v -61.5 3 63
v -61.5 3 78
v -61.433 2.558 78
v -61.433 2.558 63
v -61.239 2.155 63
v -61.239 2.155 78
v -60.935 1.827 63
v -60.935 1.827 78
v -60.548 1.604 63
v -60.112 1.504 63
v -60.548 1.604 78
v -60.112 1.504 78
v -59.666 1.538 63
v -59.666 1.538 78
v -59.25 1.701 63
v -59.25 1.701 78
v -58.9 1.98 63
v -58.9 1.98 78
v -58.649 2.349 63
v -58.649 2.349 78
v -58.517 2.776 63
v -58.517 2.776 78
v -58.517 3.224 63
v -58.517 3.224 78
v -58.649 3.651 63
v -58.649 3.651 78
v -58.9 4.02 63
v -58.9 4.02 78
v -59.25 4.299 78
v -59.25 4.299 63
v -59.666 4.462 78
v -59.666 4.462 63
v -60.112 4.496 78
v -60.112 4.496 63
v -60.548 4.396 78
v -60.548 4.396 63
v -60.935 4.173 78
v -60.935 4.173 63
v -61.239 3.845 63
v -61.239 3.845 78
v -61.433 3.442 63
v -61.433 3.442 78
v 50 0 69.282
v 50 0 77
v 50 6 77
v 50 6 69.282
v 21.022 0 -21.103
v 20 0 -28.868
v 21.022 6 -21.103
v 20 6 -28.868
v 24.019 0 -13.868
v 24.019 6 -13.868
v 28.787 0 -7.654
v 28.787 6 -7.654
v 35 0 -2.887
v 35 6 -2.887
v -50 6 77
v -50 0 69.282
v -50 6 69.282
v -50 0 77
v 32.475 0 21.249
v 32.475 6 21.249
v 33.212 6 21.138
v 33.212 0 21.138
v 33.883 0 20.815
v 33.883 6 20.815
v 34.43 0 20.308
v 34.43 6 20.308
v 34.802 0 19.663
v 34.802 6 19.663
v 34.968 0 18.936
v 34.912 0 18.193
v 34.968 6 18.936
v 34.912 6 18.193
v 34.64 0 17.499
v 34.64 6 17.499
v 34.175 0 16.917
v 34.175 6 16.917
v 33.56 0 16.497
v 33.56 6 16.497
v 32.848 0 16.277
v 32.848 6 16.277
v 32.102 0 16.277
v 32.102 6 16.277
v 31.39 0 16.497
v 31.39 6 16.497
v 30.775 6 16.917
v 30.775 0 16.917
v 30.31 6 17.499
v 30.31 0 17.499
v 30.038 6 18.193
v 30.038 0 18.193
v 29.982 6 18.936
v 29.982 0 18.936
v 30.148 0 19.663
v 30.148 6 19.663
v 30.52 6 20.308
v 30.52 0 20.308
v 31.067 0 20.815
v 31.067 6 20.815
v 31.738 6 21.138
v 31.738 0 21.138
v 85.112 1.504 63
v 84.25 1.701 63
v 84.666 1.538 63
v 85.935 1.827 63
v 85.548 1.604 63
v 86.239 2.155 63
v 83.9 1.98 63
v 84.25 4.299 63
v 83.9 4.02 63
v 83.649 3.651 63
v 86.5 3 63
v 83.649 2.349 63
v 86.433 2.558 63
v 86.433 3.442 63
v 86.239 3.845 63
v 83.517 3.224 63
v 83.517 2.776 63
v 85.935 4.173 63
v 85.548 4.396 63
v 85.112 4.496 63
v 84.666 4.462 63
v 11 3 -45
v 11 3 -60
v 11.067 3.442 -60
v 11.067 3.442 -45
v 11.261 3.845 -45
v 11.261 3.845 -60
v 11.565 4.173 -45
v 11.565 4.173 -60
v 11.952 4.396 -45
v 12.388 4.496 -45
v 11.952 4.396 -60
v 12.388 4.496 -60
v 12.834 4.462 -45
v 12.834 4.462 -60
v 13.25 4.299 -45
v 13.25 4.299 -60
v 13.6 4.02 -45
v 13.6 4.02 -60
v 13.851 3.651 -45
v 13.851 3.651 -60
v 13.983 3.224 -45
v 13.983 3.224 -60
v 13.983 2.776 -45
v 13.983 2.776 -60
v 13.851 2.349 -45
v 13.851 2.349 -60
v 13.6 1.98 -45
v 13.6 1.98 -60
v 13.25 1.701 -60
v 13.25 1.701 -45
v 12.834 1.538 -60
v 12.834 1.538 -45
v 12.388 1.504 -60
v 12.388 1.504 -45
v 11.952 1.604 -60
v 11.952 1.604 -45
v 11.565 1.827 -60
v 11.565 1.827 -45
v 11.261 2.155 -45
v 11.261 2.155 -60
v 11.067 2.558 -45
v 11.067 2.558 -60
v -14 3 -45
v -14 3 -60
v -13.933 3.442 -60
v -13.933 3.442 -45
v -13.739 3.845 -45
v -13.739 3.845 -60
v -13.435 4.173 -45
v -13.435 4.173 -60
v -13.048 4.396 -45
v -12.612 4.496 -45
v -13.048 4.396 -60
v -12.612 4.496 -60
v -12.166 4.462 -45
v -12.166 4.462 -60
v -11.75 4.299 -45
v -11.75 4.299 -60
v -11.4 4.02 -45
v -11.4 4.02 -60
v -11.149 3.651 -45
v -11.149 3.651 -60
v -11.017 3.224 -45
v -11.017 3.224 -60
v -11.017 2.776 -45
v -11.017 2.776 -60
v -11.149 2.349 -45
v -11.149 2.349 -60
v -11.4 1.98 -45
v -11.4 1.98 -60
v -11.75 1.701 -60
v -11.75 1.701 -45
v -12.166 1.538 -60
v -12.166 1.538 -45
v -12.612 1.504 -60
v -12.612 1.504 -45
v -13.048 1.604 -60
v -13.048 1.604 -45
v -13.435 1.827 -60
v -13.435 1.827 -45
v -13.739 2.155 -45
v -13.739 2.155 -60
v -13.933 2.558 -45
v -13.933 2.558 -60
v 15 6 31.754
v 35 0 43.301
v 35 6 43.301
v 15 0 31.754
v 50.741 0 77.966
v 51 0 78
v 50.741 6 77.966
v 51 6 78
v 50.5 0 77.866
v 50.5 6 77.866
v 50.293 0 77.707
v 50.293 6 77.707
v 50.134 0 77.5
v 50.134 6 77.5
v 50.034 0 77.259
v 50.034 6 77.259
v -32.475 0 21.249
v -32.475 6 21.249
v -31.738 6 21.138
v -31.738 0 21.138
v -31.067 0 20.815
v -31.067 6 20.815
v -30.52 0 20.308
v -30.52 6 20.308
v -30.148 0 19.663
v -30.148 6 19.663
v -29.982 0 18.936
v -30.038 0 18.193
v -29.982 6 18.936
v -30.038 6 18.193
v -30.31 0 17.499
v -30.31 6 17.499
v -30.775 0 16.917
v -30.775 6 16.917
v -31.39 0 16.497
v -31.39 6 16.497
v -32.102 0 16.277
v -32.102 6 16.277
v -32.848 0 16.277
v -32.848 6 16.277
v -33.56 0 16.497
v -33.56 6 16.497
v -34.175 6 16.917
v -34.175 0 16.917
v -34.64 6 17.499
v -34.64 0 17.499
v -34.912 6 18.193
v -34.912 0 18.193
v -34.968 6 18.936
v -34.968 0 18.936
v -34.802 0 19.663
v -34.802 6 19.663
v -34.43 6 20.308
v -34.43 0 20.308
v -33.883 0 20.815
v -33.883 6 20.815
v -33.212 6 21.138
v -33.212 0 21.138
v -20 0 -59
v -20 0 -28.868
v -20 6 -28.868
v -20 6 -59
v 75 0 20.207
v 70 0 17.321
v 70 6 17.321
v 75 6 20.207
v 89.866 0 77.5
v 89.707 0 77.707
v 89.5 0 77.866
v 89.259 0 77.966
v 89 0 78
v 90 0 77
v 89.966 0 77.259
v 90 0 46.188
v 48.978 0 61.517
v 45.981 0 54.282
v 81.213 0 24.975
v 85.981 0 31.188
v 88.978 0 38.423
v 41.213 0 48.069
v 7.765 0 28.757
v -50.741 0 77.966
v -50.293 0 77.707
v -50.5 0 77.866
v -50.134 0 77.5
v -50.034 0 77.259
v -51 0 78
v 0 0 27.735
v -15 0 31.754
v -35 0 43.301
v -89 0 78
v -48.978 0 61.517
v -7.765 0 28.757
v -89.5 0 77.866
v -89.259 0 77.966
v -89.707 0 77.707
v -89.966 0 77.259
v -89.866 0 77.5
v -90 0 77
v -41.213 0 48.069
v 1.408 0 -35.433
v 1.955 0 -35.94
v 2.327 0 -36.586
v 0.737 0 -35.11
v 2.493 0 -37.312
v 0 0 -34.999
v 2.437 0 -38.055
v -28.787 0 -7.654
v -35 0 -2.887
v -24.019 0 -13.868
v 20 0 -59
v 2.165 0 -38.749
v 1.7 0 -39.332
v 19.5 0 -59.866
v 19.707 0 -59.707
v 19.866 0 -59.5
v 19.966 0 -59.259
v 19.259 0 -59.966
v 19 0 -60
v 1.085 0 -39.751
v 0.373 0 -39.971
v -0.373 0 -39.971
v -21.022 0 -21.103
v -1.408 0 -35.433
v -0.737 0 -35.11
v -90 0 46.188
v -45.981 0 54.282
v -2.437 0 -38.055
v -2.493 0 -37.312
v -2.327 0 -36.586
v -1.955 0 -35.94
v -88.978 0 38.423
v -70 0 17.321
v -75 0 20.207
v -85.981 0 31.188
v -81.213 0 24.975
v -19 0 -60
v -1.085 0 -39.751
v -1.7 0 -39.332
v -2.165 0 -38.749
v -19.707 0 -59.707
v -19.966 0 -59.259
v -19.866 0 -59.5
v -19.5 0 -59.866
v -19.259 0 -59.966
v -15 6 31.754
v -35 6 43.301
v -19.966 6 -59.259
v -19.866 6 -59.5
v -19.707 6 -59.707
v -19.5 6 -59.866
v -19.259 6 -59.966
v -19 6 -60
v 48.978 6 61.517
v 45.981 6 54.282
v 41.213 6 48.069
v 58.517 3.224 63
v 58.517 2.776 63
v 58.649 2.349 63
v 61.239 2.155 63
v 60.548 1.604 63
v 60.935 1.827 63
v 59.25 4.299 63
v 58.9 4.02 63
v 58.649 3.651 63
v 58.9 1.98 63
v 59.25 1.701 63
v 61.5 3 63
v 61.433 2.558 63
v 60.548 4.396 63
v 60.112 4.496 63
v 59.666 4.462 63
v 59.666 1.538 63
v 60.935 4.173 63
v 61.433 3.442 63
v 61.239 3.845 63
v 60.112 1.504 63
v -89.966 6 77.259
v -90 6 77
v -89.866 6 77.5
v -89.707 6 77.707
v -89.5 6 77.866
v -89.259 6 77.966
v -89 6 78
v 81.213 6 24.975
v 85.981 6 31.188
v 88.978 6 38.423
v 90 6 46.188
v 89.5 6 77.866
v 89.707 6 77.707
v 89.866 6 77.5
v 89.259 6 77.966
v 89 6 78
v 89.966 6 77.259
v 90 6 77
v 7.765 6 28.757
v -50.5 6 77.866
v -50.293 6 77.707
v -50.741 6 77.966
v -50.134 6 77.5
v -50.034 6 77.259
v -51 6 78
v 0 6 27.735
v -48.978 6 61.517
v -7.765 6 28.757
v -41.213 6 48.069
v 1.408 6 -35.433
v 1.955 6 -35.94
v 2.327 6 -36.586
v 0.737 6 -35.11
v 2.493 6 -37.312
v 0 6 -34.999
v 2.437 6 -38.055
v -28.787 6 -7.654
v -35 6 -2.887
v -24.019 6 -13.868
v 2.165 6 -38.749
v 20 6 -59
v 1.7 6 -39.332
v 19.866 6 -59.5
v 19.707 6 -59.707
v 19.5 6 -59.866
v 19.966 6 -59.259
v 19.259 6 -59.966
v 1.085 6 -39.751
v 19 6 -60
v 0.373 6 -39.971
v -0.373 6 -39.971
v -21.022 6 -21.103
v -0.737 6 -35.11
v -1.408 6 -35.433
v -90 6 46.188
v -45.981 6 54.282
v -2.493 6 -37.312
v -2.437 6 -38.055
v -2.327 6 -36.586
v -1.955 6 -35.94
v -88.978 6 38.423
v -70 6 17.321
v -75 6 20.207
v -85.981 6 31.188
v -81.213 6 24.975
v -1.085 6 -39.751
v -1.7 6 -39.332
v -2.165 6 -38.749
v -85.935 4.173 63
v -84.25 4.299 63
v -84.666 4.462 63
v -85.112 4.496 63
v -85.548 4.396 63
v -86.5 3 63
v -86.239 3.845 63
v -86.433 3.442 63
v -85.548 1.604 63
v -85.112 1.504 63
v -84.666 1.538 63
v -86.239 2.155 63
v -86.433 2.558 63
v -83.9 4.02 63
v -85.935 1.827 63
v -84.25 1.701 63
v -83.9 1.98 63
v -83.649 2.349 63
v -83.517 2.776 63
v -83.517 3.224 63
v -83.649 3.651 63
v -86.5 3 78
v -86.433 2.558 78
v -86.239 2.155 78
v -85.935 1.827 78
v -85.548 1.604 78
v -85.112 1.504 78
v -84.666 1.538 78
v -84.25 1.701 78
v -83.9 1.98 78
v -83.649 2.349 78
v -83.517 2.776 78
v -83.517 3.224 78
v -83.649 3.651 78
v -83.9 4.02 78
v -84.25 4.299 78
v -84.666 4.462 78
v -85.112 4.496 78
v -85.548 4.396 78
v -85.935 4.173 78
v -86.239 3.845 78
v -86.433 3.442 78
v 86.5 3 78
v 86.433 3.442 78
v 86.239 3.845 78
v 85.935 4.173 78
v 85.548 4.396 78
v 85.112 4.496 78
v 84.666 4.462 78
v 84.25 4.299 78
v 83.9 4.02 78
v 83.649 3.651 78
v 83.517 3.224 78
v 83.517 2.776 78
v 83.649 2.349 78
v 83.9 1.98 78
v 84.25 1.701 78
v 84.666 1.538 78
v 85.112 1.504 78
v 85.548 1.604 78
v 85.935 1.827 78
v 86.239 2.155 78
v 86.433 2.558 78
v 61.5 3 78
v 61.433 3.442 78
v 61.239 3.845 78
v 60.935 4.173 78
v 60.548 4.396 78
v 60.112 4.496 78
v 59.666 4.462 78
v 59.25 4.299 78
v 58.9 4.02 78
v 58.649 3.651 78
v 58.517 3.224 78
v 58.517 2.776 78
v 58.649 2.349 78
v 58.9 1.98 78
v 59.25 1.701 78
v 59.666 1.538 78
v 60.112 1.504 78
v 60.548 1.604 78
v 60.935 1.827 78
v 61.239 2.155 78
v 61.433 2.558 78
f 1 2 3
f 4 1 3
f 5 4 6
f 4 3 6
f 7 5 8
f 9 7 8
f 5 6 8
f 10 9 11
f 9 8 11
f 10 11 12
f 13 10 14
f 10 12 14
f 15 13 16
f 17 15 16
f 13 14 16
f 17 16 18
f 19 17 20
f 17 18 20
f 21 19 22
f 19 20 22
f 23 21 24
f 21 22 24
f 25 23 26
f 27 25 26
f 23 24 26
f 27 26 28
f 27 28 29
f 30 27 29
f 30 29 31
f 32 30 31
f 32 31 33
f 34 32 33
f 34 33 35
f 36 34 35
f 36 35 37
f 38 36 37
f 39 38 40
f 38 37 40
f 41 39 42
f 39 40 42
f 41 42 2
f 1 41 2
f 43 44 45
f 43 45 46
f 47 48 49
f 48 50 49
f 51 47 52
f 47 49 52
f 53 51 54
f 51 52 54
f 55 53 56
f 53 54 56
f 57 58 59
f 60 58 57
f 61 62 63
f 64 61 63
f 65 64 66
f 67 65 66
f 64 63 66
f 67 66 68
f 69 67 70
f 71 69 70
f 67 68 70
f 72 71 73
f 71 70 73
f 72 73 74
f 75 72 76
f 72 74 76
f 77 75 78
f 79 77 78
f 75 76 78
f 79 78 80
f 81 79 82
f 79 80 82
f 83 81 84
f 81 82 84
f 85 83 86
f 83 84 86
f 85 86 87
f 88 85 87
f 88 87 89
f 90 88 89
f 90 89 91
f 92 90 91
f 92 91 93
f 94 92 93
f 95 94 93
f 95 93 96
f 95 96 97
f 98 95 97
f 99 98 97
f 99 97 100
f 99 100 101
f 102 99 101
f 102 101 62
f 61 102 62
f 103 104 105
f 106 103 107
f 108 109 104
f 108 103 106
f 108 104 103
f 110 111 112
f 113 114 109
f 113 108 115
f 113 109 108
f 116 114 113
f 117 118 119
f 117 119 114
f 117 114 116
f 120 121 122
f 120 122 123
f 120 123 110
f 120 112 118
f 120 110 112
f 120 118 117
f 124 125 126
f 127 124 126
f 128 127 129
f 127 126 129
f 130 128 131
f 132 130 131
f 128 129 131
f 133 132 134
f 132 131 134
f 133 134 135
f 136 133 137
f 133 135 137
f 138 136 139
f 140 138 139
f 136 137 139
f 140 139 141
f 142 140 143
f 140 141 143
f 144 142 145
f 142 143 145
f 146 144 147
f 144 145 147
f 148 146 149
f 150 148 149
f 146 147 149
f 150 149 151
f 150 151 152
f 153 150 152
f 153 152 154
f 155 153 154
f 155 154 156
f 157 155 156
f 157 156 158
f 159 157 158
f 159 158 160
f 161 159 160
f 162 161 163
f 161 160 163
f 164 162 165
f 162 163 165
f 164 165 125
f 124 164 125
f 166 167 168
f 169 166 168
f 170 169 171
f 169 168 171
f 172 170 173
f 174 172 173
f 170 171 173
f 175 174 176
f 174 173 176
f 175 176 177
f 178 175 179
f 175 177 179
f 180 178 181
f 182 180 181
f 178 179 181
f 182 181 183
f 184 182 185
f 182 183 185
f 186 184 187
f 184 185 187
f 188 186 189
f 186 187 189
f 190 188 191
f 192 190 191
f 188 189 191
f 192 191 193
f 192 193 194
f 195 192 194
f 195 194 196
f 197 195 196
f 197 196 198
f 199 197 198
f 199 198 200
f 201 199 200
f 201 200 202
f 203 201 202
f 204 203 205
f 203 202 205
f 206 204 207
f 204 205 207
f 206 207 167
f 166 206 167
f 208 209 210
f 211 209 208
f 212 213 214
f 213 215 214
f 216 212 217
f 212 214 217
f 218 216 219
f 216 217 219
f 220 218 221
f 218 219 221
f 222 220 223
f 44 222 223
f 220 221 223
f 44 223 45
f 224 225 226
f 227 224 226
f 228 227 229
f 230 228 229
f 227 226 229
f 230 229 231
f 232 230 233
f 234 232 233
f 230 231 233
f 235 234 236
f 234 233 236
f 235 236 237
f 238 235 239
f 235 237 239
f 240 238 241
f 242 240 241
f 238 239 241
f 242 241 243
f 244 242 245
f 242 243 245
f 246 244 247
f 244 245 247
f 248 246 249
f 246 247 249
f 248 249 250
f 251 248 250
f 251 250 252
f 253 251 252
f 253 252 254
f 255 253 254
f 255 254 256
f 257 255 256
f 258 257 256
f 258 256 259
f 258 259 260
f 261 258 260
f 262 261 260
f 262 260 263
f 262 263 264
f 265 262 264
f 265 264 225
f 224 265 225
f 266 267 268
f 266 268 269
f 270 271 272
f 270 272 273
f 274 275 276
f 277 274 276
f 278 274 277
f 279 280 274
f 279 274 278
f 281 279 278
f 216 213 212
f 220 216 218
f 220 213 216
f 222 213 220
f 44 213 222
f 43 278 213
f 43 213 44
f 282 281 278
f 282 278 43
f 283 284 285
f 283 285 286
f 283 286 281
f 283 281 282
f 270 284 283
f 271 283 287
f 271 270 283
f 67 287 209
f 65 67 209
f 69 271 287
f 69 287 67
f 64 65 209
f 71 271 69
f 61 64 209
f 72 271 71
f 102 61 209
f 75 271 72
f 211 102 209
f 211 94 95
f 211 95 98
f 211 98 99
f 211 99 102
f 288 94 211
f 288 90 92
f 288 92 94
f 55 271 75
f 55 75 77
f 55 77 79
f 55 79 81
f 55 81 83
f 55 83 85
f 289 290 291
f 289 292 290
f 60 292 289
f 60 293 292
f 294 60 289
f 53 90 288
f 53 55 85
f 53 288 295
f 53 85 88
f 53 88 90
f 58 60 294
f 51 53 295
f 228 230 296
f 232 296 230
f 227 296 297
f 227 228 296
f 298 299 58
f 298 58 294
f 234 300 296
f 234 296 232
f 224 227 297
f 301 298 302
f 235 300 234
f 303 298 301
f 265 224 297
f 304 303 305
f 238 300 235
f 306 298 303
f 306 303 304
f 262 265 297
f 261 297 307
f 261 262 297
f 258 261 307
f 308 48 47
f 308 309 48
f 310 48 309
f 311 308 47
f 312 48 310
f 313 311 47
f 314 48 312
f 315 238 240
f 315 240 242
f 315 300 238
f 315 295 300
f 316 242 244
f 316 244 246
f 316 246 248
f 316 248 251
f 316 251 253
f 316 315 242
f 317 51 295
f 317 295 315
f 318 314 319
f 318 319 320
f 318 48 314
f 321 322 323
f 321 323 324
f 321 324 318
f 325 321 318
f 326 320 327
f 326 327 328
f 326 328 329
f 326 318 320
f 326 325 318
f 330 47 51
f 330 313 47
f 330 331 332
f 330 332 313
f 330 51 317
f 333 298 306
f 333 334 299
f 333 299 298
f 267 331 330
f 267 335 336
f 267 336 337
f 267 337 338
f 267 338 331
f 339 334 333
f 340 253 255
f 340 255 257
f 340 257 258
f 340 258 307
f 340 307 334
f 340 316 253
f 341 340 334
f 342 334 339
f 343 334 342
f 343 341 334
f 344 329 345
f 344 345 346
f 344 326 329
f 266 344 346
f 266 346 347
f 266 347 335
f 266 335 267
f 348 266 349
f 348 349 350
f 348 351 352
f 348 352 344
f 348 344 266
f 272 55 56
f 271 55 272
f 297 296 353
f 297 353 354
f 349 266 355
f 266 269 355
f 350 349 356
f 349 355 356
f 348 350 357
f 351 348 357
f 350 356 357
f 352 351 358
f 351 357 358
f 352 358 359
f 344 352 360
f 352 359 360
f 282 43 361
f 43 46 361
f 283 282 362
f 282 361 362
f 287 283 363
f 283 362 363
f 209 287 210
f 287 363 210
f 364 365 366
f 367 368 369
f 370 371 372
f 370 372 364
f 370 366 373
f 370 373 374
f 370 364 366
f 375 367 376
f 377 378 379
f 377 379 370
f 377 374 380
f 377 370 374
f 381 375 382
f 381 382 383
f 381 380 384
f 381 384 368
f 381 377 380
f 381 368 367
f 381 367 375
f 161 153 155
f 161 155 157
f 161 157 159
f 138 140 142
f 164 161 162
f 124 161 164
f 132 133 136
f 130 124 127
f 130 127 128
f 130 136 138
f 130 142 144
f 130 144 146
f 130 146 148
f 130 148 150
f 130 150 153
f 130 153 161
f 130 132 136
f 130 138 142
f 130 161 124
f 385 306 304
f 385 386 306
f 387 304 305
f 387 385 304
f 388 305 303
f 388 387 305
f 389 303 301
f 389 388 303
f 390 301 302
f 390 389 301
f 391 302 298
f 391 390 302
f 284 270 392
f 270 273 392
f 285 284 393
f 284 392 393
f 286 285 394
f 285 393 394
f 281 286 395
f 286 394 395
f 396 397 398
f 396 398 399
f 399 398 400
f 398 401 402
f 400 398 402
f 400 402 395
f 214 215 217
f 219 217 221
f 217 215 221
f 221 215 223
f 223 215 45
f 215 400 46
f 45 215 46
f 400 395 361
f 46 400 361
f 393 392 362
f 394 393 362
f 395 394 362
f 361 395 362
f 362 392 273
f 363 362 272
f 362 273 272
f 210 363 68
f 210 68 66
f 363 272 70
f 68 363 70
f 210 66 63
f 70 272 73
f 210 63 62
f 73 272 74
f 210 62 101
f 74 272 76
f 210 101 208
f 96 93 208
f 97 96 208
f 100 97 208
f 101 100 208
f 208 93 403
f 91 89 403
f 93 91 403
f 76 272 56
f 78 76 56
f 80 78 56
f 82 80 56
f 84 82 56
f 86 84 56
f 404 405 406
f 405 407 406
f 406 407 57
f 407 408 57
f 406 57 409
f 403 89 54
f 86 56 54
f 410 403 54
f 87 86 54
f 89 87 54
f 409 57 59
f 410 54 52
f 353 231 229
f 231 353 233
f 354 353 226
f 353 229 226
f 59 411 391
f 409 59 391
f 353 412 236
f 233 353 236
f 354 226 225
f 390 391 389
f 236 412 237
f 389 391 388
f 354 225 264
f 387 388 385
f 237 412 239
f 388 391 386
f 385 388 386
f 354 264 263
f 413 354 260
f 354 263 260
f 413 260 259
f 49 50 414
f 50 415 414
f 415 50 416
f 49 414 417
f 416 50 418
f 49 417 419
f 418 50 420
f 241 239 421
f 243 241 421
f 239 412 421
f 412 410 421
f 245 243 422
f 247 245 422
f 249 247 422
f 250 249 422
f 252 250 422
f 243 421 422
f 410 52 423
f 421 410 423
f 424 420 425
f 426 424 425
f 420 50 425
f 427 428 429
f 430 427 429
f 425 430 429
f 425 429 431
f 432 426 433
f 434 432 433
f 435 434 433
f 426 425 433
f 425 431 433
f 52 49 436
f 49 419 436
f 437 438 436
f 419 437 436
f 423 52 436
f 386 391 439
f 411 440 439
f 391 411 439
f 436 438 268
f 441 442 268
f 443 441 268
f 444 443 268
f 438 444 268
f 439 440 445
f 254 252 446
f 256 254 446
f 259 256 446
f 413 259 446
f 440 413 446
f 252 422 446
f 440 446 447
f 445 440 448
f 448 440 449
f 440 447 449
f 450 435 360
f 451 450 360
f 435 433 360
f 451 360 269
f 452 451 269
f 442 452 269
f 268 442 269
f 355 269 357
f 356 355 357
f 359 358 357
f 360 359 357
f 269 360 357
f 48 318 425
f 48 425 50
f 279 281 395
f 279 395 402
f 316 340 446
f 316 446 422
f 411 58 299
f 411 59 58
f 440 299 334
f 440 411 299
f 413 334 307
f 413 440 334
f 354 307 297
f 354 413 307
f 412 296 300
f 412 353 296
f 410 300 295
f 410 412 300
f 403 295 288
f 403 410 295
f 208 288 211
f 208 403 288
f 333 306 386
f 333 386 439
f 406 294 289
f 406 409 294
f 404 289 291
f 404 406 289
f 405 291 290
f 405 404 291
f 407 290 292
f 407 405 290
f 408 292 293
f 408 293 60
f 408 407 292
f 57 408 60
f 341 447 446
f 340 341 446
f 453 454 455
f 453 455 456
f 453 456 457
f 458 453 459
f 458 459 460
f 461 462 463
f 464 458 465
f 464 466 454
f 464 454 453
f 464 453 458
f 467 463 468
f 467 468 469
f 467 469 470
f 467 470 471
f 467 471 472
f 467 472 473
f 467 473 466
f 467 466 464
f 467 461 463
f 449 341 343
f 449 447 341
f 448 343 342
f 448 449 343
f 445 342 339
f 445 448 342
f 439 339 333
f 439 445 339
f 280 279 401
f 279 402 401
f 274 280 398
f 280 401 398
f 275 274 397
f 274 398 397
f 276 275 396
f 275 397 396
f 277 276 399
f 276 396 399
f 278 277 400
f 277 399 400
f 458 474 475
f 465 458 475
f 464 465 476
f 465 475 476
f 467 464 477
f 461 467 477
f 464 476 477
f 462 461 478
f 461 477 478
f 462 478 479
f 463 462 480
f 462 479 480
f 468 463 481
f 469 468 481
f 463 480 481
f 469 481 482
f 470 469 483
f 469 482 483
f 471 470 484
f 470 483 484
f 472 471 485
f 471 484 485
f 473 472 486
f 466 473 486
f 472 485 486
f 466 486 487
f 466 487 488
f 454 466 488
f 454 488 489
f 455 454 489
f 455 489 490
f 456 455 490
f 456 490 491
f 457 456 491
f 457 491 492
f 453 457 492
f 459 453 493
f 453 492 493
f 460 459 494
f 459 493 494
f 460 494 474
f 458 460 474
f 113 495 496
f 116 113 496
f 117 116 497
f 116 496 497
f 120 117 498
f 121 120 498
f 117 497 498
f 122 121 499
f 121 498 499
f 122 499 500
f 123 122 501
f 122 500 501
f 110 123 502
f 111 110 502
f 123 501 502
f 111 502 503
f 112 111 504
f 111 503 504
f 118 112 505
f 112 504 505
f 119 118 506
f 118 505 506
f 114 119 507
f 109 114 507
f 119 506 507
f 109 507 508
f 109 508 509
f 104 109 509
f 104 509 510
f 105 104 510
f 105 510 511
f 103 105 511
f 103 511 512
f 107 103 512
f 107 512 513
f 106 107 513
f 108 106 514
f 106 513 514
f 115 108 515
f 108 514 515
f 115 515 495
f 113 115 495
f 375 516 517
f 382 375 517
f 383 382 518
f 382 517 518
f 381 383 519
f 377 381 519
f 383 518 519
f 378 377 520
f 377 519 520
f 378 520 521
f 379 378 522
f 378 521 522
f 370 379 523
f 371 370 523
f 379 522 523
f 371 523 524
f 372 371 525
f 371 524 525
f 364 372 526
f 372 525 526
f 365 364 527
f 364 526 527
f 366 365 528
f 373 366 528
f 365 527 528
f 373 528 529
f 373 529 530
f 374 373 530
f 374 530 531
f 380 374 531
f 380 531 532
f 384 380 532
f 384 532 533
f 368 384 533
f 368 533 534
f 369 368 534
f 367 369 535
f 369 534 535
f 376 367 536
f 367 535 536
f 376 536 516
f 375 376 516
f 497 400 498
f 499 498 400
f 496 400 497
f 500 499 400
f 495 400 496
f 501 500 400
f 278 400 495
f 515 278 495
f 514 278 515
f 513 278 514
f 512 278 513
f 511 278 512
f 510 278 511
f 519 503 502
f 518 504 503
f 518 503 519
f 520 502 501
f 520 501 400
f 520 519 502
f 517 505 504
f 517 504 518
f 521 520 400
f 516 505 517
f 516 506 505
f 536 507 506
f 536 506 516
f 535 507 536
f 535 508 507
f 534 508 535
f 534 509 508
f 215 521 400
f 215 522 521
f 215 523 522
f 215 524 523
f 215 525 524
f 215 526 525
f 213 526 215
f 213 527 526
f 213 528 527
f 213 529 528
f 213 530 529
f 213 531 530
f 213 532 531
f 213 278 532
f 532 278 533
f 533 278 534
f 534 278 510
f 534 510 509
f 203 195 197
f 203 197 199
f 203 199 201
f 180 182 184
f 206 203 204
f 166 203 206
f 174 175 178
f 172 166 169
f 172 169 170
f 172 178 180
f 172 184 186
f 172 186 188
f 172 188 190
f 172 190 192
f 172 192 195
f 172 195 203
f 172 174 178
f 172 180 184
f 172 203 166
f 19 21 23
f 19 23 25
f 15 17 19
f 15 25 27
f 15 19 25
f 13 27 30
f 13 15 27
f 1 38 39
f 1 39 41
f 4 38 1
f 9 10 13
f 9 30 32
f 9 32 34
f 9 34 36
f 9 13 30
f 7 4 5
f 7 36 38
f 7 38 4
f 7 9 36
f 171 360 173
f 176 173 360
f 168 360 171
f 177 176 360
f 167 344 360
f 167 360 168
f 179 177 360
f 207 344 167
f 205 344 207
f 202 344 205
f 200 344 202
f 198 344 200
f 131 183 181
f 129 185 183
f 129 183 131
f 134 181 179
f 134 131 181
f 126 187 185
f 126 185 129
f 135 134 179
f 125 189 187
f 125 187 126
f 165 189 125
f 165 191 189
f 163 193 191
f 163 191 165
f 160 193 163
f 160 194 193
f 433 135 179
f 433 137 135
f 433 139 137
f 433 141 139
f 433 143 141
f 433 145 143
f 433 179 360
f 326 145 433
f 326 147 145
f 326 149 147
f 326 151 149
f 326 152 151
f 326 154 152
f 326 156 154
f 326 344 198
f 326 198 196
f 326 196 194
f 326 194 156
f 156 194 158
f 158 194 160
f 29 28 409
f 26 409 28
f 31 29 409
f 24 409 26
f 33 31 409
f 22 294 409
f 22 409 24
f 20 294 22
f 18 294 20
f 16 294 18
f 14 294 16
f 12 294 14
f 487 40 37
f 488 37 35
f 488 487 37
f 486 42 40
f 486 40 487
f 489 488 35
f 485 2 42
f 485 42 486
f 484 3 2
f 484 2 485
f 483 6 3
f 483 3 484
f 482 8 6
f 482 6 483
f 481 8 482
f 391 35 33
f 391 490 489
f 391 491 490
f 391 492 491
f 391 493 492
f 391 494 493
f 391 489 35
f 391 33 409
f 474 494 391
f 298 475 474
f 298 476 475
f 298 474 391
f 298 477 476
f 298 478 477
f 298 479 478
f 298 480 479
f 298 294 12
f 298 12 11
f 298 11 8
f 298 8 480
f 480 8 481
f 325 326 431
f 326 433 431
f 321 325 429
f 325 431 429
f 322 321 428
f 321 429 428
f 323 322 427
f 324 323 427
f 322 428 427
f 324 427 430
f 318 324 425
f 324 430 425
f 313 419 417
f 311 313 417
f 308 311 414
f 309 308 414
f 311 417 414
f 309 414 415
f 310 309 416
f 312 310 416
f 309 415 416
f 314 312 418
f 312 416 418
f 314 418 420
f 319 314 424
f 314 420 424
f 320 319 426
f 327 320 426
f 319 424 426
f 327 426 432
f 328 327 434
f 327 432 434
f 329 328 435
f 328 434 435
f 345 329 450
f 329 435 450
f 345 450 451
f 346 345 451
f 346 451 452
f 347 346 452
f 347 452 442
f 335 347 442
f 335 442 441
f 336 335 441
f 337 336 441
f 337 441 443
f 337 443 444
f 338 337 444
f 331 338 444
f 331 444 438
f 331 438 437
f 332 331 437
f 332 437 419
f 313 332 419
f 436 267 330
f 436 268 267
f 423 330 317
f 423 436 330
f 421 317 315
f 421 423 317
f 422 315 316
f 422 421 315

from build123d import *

# Parameters (mm, degrees)
EXTRUDE_1_DEPTH     = 6
SKETCH_3_R          = 2.5
CUT_EXTRUDE_1_DEPTH = 13
FILLET_1_R          = 30
FILLET_2_R          = 1
SKETCH_6_R          = 1.5
CUT_EXTRUDE_3_DEPTH = 15
SKETCH_7_R          = 1.5
CUT_EXTRUDE_4_DEPTH = 15


with BuildPart() as part:
    # 草图1 → 凸台-拉伸1 (new body)
    with BuildSketch(Plane(origin=(0, 0, 0), x_dir=(1, 0, 0), z_dir=(0, 1, 0))):
        Polygon((-20, 60), (20, 60), (20, 11.547005384), (70, -17.320508076), (90, -28.867513459), (90, -78), (50, -78), (50, -51.961524227), (0, -23.094010768), (-50, -51.961524227), (-50, -78), (-90, -78), (-90, -28.867513459), (-70, -17.320508076), (-20, 11.547005384), align=None)
    extrude(amount=EXTRUDE_1_DEPTH)

    # 草图3 → 切除-拉伸1 (cut)
    with BuildSketch(Plane(origin=(0, 6, 0), x_dir=(1, 0, 0), z_dir=(0, 1, 0))):
        with Locations(Location((0, 37.498899984, 0), (0, 0, 270))):
            Circle(SKETCH_3_R)
        with Locations(Location((32.475, -18.749449992, 0), (0, 0, 270))):
            Circle(SKETCH_3_R)
        with Locations(Location((-32.475, -18.749449992, 0), (0, 0, 270))):
            Circle(SKETCH_3_R)
    extrude(amount=-CUT_EXTRUDE_1_DEPTH, mode=Mode.SUBTRACT)

    # 圆角1
    fillet_1_edges = [part.edges().sort_by_distance(p)[0] for p in [
        (-20, 3, -11.547005384),
        (20, 3, -11.547005384),
        (90, 3, 28.867513459),
        (50, 3, 51.961524227),
        (0, 3, 23.094010768),
        (-50, 3, 51.961524227),
        (-90, 3, 28.867513459),
    ]]
    fillet(fillet_1_edges, radius=FILLET_1_R)

    # 圆角2
    fillet_2_edges = [part.edges().sort_by_distance(p)[0] for p in [
        (-20, 3, -60),
        (20, 3, -60),
        (90, 3, 78),
        (50, 3, 78),
        (-50, 3, 78),
        (-90, 3, 78),
    ]]
    fillet(fillet_2_edges, radius=FILLET_2_R)

    # 草图6 → 切除-拉伸3 (cut)
    with BuildSketch(Plane.XY.offset(78)):
        with Locations((60, 3)):
            Circle(SKETCH_6_R)
        with Locations((85, 3)):
            Circle(SKETCH_6_R)
        with Locations(Location((-85, 3, 0), (0, 0, 180))):
            Circle(SKETCH_6_R)
        with Locations(Location((-60, 3, 0), (0, 0, 180))):
            Circle(SKETCH_6_R)
    extrude(amount=-CUT_EXTRUDE_3_DEPTH, mode=Mode.SUBTRACT)

    # 草图7 → 切除-拉伸4 (cut)
    with BuildSketch(Plane(origin=(0, 0, -60), x_dir=(-1, 0, 0), z_dir=(0, 0, -1))):
        with Locations((12.5, 3)):
            Circle(SKETCH_7_R)
        with Locations((-12.5, 3)):
            Circle(SKETCH_7_R)
    extrude(amount=-CUT_EXTRUDE_4_DEPTH, mode=Mode.SUBTRACT)


solid = part.part
